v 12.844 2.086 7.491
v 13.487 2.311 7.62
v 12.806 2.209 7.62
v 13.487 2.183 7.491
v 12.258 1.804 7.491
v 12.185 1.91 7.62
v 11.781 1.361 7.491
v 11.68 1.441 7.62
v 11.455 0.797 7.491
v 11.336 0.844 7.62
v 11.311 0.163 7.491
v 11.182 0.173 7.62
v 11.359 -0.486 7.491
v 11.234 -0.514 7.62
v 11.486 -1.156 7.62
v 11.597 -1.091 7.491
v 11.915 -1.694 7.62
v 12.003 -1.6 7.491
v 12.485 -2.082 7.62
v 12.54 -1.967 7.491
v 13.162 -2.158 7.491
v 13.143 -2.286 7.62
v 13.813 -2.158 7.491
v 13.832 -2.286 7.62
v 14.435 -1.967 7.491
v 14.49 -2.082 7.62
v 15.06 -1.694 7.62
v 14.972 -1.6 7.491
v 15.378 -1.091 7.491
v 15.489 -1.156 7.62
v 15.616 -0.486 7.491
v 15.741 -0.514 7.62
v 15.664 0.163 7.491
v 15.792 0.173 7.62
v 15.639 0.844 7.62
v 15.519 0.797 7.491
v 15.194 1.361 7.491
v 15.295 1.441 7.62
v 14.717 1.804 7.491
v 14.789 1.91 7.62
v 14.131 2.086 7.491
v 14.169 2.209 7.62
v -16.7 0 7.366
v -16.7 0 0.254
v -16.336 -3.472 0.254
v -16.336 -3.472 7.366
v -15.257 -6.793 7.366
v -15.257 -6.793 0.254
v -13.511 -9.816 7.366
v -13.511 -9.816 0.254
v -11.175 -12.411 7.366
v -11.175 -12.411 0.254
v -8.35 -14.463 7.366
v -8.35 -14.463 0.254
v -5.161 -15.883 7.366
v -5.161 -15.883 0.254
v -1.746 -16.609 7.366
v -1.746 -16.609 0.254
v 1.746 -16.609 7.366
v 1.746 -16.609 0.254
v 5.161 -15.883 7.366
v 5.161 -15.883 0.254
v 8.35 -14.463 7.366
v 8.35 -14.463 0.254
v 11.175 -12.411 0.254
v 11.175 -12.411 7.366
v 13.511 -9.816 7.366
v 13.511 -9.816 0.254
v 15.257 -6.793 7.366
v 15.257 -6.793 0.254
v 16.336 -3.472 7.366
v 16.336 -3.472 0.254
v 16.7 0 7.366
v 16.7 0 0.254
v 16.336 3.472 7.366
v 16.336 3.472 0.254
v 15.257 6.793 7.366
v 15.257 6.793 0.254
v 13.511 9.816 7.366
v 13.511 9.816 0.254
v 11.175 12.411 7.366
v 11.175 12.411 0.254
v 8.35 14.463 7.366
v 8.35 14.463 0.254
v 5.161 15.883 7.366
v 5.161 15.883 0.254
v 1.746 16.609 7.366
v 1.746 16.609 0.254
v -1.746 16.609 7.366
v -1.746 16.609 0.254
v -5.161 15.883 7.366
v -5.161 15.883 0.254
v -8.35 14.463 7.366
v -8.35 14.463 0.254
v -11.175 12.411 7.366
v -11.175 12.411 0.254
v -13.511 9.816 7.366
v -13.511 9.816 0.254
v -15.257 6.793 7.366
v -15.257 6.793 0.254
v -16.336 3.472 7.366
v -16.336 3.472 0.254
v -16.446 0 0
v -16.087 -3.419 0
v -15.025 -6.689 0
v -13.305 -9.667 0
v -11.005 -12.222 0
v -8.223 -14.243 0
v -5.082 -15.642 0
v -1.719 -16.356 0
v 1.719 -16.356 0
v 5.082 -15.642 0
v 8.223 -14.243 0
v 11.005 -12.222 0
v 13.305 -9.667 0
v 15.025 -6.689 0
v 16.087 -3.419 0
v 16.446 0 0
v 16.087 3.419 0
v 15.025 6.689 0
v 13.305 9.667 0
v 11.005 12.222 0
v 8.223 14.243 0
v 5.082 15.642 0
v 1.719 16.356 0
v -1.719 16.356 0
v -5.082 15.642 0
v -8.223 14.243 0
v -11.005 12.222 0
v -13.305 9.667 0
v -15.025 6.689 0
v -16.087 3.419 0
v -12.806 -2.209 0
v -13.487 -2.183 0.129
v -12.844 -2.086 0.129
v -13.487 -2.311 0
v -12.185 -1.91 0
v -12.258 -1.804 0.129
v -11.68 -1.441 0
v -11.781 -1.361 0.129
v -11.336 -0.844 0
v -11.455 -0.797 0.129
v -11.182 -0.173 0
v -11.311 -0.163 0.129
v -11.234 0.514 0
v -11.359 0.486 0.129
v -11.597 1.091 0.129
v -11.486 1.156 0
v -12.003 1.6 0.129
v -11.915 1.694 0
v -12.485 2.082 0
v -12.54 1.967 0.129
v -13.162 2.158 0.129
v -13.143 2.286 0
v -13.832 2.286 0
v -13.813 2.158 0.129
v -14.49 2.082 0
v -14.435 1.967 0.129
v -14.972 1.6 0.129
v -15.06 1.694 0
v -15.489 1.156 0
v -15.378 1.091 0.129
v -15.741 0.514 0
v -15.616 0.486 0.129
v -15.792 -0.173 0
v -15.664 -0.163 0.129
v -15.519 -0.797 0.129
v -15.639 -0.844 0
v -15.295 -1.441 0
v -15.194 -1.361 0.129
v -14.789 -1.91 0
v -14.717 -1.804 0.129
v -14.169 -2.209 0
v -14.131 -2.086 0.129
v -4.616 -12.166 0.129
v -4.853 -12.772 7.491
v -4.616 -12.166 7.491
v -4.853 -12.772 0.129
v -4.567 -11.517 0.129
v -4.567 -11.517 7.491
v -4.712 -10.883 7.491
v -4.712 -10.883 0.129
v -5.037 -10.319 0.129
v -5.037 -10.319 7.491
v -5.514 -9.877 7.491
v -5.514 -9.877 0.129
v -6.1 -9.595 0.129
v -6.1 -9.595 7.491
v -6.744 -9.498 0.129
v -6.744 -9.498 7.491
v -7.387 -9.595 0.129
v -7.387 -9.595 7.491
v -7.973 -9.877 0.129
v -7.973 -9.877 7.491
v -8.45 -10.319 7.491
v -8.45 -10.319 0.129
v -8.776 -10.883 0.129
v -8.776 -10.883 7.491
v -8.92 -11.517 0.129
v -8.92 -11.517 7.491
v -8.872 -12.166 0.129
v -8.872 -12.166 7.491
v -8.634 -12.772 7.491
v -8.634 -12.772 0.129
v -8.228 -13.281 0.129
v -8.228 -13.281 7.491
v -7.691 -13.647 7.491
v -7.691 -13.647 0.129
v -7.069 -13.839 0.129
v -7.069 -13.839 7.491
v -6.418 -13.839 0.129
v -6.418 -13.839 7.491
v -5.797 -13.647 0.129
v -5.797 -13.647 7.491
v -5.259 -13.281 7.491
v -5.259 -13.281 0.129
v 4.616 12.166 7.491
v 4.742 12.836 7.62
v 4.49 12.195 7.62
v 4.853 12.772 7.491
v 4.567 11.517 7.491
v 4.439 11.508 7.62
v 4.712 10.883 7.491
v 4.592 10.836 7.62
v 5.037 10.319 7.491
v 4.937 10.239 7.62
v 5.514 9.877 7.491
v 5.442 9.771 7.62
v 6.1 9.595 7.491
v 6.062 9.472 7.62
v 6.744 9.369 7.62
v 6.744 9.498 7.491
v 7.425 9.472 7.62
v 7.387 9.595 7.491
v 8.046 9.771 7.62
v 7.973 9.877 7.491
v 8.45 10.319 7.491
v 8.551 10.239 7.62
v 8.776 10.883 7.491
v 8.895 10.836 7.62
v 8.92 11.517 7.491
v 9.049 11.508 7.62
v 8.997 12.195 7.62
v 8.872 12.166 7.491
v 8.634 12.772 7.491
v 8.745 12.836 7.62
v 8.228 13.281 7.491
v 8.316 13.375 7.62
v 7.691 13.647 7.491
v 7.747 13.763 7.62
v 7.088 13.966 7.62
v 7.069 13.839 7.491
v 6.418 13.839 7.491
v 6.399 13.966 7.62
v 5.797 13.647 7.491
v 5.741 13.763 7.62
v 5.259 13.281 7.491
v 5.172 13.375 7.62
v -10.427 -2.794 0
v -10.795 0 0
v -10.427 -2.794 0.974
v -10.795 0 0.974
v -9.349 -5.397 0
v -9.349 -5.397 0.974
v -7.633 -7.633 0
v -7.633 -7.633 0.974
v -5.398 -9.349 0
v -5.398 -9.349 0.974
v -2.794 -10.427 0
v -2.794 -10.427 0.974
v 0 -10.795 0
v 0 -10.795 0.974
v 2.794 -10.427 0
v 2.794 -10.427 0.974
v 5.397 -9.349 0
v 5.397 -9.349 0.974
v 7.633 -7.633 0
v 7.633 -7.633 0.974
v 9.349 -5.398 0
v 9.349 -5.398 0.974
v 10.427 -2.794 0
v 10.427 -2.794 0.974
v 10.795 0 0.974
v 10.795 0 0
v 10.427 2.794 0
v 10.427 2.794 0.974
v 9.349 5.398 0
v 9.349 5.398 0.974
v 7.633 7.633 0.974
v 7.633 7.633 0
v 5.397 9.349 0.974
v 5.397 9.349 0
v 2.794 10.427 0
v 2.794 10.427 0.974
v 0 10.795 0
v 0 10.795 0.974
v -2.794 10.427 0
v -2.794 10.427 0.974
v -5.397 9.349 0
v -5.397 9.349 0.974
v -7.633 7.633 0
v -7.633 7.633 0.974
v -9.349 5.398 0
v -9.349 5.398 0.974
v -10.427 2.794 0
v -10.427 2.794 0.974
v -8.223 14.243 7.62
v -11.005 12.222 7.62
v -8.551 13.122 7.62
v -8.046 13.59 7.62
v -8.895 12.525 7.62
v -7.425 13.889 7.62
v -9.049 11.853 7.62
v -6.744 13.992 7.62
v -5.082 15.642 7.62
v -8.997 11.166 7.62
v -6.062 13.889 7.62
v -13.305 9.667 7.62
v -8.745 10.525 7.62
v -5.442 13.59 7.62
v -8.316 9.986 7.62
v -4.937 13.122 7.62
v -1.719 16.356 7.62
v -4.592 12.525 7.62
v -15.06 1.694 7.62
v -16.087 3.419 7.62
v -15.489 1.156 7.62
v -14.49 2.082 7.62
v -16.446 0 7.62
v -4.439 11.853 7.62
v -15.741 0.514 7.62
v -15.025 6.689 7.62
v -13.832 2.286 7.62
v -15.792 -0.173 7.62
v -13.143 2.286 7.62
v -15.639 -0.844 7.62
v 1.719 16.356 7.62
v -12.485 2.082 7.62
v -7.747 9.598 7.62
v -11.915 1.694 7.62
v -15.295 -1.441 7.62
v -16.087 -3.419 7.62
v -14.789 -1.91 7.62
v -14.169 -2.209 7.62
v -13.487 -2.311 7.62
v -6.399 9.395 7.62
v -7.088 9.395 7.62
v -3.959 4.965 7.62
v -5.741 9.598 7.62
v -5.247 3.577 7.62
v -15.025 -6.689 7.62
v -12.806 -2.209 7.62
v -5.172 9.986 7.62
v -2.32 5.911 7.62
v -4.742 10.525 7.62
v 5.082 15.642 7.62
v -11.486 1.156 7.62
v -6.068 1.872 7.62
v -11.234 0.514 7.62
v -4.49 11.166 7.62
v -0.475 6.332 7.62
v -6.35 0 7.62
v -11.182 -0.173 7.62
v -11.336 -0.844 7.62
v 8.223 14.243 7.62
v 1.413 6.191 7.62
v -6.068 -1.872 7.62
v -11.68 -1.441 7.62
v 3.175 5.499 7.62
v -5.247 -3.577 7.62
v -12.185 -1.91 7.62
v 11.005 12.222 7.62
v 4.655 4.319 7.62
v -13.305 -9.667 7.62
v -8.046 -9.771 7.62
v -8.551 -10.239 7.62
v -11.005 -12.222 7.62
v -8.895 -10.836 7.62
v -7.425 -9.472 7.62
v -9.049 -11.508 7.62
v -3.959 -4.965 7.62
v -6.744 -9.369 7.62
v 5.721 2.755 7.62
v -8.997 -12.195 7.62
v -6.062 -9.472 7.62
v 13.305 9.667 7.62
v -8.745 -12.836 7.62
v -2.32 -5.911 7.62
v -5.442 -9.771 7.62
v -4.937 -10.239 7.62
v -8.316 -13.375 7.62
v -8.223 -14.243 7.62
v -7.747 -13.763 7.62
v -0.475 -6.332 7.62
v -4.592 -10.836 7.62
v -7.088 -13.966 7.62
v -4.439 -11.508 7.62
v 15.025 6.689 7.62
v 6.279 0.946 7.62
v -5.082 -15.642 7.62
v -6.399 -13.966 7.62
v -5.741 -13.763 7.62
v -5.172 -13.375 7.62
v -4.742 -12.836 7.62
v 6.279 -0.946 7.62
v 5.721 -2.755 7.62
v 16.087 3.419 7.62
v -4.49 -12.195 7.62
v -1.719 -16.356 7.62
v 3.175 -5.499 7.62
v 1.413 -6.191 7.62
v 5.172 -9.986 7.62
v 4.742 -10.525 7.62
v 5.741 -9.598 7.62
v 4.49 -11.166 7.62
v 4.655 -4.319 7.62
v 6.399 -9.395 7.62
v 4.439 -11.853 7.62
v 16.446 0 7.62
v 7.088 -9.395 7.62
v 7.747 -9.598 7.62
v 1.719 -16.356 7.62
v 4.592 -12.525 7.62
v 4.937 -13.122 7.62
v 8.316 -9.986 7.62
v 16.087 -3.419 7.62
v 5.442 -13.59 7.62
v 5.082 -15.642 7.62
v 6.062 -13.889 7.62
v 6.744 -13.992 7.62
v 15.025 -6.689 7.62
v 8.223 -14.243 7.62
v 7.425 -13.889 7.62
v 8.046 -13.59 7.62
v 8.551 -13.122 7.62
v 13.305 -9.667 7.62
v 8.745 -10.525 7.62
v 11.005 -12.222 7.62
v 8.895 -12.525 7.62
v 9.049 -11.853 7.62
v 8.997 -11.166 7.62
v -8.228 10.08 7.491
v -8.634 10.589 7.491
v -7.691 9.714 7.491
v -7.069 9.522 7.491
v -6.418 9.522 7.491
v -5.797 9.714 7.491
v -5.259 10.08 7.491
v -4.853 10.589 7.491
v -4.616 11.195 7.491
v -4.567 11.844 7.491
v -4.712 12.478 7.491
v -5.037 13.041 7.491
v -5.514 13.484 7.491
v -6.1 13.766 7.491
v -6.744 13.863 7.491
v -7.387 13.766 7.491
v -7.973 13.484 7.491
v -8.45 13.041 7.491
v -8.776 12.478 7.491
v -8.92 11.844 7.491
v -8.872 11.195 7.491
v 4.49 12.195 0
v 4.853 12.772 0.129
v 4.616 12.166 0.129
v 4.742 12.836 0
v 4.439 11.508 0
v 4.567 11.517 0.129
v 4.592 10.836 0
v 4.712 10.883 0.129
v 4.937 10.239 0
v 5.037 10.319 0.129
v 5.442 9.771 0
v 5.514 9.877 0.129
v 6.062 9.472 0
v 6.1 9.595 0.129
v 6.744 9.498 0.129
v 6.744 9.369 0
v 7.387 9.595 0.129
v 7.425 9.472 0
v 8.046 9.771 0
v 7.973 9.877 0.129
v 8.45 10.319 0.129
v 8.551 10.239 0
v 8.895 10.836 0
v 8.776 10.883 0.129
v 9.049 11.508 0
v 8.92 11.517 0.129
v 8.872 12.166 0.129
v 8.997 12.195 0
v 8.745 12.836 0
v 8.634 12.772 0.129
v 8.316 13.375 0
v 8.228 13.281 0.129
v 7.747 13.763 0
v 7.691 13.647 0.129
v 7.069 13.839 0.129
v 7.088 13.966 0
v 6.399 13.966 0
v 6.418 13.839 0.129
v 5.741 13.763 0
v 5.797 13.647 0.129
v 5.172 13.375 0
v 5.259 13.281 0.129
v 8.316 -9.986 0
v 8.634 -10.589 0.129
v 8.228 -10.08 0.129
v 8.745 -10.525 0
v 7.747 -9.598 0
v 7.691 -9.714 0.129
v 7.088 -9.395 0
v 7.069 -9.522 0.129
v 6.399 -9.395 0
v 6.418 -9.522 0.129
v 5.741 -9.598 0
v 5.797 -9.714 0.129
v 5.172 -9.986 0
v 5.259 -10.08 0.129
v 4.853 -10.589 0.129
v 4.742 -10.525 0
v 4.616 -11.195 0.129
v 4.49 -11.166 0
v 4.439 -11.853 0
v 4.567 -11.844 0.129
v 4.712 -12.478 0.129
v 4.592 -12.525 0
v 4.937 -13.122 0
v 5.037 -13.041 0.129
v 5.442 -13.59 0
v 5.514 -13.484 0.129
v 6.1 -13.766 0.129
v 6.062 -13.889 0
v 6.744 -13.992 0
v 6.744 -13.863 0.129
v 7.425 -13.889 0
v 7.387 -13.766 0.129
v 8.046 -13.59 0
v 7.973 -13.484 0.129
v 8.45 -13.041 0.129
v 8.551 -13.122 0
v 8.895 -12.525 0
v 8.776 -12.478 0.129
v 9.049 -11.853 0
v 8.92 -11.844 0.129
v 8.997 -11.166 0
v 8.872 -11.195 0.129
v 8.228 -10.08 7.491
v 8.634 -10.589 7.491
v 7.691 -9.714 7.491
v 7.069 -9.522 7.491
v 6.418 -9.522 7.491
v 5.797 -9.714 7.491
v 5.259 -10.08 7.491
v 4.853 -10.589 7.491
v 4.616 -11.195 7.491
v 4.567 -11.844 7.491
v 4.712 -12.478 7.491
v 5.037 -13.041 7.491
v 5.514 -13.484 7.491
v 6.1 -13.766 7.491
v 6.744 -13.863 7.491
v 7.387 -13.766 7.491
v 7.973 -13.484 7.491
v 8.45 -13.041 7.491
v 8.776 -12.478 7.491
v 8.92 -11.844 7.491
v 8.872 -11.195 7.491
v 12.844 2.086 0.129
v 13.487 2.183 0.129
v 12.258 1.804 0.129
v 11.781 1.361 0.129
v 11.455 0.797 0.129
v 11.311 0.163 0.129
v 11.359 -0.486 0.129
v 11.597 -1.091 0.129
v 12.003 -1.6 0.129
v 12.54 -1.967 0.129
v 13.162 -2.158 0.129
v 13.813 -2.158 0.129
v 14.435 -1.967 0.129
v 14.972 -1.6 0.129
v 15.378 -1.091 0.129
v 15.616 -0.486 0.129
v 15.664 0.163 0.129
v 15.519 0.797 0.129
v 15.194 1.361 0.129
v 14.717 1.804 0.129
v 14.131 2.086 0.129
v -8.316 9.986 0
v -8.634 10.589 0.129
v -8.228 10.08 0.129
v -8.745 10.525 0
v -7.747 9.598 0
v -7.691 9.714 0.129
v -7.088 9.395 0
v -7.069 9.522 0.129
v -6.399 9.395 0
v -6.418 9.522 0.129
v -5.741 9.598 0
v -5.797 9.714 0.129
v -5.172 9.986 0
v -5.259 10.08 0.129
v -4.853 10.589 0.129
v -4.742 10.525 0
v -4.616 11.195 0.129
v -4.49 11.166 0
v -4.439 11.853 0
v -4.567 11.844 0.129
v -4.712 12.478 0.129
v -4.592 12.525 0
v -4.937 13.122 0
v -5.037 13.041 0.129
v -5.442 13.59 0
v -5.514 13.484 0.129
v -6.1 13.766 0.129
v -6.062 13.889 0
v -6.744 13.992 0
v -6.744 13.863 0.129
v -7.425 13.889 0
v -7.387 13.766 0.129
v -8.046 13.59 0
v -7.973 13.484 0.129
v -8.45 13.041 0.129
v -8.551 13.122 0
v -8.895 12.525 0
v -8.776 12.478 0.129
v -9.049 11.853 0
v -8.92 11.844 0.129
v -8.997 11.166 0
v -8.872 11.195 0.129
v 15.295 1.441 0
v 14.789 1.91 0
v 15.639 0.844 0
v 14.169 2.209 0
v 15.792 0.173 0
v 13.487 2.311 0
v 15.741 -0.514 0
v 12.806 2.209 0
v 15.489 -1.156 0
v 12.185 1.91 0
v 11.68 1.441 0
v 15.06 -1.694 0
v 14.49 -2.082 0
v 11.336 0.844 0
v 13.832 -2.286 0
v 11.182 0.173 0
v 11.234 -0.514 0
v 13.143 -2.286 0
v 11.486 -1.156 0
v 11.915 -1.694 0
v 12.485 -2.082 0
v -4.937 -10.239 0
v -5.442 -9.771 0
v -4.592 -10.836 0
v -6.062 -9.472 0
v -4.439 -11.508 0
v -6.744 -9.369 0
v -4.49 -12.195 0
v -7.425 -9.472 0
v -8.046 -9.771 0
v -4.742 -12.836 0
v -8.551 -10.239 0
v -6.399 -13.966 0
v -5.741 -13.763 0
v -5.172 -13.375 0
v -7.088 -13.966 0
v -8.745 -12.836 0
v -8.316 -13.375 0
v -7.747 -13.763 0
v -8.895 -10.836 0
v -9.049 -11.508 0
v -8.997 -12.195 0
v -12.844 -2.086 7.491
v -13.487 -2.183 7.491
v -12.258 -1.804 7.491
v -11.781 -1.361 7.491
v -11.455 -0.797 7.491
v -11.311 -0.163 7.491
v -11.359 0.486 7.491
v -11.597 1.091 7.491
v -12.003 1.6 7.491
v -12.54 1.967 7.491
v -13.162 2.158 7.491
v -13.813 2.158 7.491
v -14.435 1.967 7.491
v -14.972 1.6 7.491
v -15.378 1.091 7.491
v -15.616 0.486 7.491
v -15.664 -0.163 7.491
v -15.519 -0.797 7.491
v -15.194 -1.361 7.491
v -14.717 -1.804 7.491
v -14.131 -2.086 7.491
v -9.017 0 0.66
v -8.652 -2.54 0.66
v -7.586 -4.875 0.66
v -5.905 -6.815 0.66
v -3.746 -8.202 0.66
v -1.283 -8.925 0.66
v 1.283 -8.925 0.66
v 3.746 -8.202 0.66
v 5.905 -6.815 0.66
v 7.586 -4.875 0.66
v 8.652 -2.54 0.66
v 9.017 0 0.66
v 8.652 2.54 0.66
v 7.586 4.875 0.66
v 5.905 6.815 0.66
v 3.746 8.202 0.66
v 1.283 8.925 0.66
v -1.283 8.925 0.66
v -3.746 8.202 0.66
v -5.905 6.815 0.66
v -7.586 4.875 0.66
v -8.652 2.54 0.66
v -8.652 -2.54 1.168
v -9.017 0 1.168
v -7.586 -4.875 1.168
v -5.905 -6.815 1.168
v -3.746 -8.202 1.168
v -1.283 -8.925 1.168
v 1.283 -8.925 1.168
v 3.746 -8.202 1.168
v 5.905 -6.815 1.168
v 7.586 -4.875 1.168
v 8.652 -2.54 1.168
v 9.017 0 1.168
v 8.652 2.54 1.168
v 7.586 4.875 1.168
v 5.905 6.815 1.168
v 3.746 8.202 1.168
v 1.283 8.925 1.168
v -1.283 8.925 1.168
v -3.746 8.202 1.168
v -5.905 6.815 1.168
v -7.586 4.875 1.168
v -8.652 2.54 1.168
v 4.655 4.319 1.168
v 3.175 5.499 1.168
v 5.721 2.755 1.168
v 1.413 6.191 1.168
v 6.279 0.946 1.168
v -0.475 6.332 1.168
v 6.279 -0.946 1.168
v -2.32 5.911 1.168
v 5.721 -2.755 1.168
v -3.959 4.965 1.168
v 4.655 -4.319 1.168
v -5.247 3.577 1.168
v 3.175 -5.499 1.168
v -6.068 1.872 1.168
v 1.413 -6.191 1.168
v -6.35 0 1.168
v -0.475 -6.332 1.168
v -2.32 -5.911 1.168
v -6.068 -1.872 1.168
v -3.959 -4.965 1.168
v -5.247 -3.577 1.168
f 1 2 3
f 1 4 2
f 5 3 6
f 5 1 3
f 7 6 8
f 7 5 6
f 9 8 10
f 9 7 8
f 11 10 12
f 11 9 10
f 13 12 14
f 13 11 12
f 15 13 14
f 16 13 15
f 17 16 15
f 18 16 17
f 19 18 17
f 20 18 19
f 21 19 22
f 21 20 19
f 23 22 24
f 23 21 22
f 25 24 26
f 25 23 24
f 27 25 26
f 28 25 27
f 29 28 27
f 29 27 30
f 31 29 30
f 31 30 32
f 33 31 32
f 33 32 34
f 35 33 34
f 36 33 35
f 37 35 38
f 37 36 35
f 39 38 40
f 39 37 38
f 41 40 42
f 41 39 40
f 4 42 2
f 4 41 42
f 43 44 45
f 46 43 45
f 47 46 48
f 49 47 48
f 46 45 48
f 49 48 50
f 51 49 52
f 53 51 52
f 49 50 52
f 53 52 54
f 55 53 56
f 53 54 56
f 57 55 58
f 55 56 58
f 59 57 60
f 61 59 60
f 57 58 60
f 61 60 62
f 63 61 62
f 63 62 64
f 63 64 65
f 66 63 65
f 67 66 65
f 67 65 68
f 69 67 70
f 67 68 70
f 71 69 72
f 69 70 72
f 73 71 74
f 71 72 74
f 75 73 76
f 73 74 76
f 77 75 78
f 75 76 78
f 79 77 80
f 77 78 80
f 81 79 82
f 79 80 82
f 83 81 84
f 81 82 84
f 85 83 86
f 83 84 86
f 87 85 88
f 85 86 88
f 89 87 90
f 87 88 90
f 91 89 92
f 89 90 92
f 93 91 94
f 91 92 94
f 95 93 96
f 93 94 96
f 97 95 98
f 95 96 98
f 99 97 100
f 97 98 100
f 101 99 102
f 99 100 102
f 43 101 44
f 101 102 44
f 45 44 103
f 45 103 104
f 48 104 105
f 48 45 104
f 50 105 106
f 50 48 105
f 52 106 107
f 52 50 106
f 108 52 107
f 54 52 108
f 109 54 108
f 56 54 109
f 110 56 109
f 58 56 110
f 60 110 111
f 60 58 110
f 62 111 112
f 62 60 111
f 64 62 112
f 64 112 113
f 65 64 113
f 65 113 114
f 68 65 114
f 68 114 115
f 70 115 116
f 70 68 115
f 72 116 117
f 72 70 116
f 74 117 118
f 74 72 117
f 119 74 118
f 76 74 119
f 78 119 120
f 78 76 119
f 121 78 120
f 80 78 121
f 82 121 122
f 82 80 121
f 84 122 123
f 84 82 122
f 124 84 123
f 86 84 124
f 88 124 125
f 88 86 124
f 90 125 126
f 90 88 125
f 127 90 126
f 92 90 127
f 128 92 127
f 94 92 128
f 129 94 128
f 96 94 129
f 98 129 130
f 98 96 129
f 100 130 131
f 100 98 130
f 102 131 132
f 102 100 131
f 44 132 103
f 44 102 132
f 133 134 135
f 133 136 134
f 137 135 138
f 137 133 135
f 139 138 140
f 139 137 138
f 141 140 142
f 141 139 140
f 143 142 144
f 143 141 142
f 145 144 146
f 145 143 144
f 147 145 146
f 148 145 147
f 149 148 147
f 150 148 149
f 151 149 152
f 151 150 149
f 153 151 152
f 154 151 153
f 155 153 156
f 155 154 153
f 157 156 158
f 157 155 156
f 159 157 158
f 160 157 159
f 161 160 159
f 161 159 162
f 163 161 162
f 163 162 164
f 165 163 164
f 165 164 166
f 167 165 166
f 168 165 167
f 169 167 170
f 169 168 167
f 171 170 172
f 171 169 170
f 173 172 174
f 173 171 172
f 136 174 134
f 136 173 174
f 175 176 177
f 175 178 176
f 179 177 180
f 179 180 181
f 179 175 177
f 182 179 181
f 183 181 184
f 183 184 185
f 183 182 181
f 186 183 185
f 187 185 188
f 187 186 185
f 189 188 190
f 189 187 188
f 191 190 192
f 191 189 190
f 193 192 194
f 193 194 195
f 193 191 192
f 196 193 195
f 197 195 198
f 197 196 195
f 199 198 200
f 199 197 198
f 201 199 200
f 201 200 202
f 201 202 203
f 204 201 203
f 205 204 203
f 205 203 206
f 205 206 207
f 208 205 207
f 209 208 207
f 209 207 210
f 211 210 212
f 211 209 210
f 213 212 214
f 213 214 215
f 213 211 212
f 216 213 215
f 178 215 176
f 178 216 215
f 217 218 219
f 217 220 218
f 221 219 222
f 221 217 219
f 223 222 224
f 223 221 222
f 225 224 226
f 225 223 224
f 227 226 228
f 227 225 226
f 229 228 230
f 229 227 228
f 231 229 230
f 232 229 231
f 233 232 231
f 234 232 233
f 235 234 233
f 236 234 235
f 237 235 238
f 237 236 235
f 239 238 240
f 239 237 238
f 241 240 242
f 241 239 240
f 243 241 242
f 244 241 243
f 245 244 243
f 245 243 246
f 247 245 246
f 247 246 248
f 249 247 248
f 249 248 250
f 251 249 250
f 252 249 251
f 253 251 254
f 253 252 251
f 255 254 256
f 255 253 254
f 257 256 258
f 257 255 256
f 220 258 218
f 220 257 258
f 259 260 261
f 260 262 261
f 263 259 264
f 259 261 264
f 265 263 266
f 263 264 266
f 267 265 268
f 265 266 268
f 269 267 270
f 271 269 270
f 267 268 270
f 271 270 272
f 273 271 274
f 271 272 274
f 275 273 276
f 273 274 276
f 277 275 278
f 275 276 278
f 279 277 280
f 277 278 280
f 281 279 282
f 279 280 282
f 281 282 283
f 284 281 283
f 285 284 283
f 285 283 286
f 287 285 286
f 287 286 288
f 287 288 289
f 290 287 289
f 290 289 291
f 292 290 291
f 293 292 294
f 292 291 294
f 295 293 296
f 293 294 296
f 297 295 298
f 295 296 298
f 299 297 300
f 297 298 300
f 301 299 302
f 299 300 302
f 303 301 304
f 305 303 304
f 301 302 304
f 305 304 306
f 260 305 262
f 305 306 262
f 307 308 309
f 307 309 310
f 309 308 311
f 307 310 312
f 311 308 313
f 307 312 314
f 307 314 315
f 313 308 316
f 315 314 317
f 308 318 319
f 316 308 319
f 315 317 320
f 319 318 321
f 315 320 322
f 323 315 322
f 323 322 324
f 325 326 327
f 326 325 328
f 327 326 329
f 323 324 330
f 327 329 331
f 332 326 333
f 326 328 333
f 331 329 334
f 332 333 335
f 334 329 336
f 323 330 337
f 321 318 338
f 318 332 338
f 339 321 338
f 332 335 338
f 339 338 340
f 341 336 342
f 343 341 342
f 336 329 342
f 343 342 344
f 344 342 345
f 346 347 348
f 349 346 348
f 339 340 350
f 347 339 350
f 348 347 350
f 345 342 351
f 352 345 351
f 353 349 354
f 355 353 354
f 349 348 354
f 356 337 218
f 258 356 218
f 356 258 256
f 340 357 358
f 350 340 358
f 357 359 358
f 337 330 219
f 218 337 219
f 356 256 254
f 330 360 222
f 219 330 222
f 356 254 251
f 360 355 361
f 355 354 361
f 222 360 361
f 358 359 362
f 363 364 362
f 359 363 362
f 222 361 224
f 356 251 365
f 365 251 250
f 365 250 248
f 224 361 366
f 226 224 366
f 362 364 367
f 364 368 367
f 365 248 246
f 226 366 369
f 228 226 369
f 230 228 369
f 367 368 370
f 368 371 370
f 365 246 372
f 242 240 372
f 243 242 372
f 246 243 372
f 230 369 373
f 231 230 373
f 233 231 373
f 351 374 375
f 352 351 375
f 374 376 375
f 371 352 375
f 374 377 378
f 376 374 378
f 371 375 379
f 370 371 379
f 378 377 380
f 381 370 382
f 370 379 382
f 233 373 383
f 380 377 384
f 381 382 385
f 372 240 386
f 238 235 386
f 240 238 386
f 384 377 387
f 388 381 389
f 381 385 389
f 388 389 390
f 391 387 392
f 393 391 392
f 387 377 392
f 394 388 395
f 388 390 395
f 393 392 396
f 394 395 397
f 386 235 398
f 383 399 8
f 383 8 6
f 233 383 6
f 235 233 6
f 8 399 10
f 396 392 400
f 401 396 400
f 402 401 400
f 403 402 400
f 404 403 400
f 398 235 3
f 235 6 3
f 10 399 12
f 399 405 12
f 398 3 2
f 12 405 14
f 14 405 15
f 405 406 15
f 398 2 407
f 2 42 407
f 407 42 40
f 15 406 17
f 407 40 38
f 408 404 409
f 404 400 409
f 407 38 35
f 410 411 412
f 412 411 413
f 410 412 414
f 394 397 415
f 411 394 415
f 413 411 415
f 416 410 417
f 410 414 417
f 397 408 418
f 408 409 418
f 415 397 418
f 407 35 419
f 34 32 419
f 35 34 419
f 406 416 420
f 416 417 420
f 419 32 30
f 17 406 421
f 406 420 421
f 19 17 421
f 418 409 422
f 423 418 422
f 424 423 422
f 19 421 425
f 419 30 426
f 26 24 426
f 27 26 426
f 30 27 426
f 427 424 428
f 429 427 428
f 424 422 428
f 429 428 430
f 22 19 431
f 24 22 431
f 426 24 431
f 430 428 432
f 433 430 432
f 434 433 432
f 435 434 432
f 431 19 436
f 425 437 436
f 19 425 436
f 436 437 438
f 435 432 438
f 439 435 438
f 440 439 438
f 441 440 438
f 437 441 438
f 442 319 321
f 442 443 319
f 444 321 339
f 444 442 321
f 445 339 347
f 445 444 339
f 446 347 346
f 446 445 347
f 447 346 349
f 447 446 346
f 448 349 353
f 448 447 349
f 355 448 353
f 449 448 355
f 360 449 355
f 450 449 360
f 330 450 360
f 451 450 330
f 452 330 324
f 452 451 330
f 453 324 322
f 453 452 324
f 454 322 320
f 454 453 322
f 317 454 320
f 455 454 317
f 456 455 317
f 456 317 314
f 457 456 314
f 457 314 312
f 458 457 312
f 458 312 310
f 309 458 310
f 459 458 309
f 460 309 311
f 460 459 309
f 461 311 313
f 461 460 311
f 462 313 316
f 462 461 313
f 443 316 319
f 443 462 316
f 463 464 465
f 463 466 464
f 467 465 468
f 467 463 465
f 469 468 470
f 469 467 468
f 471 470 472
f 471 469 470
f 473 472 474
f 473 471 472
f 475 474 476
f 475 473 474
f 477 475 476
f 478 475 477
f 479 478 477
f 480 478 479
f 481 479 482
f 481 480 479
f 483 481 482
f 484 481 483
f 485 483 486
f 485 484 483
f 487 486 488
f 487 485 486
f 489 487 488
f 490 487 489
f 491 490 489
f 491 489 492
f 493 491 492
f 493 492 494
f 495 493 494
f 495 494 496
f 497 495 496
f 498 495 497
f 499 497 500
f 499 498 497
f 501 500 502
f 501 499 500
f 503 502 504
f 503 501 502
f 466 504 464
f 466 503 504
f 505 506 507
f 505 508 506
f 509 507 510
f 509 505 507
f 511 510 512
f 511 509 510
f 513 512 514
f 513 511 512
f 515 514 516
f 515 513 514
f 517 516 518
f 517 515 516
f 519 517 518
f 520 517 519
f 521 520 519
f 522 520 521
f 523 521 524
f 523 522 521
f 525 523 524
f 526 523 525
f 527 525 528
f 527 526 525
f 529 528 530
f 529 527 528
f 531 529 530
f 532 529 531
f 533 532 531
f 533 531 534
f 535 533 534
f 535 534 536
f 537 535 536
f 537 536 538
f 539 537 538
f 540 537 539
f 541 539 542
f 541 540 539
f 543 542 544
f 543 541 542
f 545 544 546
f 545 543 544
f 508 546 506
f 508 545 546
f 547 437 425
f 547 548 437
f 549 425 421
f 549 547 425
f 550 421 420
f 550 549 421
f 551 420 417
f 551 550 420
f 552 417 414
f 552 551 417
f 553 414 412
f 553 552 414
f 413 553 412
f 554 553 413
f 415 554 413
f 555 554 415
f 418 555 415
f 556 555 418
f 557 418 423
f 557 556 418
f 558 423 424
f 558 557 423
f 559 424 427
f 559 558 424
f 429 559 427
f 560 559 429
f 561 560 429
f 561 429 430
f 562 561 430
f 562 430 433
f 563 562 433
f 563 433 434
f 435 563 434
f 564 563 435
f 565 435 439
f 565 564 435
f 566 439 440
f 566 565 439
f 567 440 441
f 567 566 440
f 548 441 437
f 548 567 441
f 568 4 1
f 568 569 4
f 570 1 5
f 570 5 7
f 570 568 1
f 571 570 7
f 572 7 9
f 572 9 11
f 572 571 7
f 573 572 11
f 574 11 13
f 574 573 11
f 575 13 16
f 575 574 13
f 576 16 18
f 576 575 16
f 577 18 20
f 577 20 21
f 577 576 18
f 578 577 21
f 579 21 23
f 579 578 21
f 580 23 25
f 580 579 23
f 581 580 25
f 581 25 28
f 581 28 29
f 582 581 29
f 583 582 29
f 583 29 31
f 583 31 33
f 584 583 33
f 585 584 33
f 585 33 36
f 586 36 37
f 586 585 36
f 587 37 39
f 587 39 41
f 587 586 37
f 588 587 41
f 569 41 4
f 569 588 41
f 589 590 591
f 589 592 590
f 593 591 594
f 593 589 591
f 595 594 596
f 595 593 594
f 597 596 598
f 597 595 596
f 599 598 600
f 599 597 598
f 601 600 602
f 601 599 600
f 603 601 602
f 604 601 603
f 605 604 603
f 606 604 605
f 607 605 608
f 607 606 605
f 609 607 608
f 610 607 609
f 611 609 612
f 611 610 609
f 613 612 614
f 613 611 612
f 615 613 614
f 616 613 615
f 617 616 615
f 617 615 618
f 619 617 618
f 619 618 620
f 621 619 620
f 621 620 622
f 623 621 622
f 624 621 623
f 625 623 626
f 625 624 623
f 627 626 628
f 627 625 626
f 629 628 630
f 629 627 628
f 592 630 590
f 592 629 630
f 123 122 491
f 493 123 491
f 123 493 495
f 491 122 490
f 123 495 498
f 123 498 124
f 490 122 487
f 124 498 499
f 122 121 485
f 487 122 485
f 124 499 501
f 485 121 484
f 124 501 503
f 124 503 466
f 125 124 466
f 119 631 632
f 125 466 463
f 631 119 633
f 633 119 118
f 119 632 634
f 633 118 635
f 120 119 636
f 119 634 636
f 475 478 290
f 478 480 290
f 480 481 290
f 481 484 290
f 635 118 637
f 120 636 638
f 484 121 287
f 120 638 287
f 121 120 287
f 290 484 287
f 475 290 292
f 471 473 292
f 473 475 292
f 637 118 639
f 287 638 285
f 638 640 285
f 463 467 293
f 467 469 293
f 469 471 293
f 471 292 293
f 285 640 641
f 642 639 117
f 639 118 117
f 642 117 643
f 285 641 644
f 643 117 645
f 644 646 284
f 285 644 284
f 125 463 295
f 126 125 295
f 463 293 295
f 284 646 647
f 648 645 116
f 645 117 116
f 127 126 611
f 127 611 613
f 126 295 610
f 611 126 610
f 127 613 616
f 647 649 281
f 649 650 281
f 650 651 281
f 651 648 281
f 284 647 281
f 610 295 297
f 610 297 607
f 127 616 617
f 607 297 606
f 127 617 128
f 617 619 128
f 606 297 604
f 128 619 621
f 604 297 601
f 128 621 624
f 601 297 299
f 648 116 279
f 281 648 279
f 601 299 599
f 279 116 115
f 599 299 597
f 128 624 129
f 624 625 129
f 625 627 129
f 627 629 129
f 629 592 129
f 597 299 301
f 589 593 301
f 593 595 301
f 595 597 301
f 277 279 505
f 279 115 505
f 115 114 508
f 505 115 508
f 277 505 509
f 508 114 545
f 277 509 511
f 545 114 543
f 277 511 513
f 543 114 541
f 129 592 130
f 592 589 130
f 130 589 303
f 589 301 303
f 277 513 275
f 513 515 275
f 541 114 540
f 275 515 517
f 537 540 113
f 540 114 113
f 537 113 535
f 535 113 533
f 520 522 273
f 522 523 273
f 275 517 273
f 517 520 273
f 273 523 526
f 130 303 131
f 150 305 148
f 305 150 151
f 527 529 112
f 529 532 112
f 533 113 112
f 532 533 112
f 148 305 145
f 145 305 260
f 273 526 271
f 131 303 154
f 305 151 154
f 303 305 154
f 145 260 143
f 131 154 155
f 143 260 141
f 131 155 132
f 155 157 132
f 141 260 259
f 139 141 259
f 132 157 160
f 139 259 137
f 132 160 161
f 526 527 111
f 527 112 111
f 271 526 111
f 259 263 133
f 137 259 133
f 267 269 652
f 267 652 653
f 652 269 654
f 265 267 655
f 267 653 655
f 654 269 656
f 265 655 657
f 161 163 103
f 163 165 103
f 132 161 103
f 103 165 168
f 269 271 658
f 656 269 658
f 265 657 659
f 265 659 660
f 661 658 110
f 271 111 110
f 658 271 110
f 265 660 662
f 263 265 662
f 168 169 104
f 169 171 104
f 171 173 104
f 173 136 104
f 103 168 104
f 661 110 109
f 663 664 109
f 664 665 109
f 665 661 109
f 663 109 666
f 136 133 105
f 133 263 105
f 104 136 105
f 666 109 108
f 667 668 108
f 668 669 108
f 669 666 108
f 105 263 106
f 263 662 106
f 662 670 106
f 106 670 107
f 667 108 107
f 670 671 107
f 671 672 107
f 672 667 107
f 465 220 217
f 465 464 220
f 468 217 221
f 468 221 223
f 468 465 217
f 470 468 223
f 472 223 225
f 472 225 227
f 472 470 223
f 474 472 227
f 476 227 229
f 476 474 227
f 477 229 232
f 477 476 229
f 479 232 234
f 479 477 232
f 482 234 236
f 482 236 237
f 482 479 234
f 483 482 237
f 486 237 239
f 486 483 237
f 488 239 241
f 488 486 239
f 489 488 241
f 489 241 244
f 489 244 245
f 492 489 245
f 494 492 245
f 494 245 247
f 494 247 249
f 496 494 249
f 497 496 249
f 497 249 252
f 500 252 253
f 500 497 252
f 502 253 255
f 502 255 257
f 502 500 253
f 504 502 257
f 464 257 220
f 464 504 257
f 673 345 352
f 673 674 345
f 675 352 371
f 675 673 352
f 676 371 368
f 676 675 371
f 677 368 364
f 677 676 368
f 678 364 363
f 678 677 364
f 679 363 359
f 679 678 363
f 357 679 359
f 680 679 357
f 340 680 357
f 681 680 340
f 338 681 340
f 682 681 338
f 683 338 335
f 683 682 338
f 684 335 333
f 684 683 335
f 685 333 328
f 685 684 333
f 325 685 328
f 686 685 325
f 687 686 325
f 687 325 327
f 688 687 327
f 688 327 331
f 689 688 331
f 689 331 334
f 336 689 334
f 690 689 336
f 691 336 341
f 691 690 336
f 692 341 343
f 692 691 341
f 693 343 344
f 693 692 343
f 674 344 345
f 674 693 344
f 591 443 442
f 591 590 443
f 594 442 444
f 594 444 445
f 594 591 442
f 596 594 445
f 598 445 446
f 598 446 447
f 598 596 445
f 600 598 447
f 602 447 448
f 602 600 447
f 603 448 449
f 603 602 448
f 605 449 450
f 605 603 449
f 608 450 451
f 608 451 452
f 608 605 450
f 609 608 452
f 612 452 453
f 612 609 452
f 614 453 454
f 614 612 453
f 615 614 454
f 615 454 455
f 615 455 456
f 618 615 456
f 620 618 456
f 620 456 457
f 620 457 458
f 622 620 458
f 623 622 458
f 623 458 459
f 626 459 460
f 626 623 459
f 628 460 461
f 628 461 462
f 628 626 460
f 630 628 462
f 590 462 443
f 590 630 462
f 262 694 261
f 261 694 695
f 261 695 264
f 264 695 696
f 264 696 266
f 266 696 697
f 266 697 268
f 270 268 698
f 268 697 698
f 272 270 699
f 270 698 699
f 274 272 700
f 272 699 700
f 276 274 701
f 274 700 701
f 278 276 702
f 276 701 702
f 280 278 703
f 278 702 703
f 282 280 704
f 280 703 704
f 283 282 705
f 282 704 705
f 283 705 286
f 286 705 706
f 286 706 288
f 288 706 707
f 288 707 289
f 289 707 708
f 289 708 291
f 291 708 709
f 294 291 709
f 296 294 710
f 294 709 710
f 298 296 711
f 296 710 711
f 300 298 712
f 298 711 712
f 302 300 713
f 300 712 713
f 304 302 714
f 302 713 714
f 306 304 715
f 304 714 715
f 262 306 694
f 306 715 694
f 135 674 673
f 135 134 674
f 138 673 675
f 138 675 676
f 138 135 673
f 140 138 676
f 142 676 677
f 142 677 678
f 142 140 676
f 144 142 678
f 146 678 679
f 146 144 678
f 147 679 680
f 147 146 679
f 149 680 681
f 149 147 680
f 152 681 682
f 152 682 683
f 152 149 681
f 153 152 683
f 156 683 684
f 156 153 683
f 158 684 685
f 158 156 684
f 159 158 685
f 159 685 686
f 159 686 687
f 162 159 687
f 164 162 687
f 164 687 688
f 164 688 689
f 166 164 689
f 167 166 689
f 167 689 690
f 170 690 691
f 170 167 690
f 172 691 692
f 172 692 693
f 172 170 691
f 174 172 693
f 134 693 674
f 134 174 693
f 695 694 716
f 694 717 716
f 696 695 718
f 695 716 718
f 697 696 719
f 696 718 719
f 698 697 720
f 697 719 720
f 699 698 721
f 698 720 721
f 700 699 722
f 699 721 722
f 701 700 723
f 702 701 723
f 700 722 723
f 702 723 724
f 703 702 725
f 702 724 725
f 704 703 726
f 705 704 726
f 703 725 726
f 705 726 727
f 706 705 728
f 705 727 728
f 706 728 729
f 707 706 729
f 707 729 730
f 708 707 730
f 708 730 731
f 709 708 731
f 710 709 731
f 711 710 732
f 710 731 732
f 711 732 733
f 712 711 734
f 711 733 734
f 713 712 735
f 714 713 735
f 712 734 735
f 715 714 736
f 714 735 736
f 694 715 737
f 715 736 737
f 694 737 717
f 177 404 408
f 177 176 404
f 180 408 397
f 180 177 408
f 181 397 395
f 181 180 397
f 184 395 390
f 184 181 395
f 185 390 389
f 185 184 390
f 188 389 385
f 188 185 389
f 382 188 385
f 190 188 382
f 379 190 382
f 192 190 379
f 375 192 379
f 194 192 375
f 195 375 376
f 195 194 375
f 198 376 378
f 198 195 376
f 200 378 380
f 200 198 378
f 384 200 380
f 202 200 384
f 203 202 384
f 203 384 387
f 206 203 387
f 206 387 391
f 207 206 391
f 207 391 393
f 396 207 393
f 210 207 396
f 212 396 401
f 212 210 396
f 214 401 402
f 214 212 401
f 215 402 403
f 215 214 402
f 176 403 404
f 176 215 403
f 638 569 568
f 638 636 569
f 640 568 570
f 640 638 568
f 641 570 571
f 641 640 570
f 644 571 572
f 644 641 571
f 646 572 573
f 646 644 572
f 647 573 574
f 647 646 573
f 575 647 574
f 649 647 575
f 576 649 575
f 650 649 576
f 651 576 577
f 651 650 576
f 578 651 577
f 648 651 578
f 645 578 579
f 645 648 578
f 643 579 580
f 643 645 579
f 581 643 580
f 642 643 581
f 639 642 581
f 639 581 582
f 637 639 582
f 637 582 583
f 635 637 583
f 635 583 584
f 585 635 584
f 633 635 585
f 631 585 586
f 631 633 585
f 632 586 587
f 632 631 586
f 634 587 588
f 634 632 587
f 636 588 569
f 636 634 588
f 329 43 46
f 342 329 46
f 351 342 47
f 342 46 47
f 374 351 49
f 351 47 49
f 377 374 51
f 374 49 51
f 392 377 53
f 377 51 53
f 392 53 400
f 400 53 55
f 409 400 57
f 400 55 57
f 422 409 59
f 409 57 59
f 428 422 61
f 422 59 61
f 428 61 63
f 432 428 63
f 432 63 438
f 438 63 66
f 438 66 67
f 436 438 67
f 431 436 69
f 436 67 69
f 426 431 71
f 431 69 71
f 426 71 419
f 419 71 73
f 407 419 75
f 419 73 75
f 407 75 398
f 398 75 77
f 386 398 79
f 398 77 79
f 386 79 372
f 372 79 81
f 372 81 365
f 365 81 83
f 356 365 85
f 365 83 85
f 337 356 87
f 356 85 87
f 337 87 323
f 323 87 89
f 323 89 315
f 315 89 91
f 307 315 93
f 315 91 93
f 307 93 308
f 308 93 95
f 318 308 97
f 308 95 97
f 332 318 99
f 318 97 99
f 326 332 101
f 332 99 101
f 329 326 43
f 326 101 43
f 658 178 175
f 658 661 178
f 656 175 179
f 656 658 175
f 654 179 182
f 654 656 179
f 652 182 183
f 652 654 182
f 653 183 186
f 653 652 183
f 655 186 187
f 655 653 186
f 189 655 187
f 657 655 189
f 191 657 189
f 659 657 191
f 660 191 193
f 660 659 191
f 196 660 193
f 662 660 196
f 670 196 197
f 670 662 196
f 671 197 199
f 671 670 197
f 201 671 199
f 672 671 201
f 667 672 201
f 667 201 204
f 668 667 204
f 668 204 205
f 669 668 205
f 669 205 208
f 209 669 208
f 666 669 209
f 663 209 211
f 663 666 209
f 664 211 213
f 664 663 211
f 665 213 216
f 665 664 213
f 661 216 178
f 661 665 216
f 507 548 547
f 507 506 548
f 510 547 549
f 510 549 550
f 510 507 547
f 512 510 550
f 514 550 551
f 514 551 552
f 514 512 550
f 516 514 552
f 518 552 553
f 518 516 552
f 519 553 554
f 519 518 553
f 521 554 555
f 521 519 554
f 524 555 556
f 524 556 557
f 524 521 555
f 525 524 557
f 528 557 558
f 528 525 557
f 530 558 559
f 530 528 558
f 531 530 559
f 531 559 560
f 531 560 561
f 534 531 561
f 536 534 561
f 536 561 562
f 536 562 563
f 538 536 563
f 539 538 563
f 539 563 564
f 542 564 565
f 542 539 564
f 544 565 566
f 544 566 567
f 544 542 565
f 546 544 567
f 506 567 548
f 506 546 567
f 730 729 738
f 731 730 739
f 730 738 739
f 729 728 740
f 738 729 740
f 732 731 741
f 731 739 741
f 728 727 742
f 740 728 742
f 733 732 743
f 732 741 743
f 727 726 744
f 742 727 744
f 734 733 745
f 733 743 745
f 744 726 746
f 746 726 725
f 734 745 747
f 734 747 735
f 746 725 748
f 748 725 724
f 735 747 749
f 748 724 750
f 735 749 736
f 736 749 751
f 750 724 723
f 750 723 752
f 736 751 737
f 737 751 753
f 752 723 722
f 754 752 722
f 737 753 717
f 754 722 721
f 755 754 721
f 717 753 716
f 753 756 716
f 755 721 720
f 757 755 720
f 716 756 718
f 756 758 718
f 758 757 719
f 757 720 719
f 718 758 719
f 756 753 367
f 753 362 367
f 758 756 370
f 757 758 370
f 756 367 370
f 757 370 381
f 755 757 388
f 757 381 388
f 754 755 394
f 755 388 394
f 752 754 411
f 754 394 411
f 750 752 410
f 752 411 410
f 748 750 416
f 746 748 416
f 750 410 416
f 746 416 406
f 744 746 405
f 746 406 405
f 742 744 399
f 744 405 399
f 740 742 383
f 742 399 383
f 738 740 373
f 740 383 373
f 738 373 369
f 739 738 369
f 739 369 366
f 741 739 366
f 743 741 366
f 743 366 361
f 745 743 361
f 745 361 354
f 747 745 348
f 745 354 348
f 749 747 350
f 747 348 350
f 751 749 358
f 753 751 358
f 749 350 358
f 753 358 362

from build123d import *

# Parameters (mm, degrees)
CHAMFER1_SIZE     = 0.254
CIRPATTERN1_COUNT = 6


with BuildPart() as part:
    # Sketch1 → Revolve1 (revolve)
    with BuildSketch(Plane(origin=(0, 0, 0), x_dir=(0, 0, -1), z_dir=(1, 0, 0)), mode=Mode.PRIVATE) as revolve1_sk:
        Polygon((0, 16.7005), (0, 10.795), (-0.973909372, 10.795), (-0.6604, 9.017), (-1.1684, 9.017), (-1.1684, 6.35), (-7.62, 6.35), (-7.62, 16.7005), align=None)
    revolve(revolve1_sk.sketch.rotate(Axis((0, 0, 0), (0, 0, 1)), 90), axis=Axis((0, 0, 0), (0, 0, 1)))

    # Chamfer1
    chamfer1_edges = [part.edges().sort_by_distance(p)[0] for p in [
        (16.7005, 0, 0),
        (16.7005, 0, 7.62),
    ]]
    chamfer(chamfer1_edges, length=CHAMFER1_SIZE)

    # Sketch2 → 11/64 (0.17188) Diameter Hole2 (revolve, cut)
    with BuildSketch(Plane.YZ.offset(13.4874)):
        Polygon((0, 0), (0, 7.62), (2.3114, 7.62), (2.182876, 7.491476), (2.182876, 0.128524), (2.3114, 0), align=None)
    f_11_64_0_17188_diameter_hole2 = revolve(axis=Axis((13.4874, 0, -6.35), (0, 0, 1)), mode=Mode.SUBTRACT)

    # CirPattern1: 11/64 (0.17188) Diameter Hole2 ×6 about axis
    cirpattern1_axis = Axis((0, 0, 0), (0, 0, 1))
    for i in range(1, CIRPATTERN1_COUNT):
        add(f_11_64_0_17188_diameter_hole2.rotate(cirpattern1_axis, i * 360 / CIRPATTERN1_COUNT), mode=Mode.SUBTRACT)


solid = part.part
